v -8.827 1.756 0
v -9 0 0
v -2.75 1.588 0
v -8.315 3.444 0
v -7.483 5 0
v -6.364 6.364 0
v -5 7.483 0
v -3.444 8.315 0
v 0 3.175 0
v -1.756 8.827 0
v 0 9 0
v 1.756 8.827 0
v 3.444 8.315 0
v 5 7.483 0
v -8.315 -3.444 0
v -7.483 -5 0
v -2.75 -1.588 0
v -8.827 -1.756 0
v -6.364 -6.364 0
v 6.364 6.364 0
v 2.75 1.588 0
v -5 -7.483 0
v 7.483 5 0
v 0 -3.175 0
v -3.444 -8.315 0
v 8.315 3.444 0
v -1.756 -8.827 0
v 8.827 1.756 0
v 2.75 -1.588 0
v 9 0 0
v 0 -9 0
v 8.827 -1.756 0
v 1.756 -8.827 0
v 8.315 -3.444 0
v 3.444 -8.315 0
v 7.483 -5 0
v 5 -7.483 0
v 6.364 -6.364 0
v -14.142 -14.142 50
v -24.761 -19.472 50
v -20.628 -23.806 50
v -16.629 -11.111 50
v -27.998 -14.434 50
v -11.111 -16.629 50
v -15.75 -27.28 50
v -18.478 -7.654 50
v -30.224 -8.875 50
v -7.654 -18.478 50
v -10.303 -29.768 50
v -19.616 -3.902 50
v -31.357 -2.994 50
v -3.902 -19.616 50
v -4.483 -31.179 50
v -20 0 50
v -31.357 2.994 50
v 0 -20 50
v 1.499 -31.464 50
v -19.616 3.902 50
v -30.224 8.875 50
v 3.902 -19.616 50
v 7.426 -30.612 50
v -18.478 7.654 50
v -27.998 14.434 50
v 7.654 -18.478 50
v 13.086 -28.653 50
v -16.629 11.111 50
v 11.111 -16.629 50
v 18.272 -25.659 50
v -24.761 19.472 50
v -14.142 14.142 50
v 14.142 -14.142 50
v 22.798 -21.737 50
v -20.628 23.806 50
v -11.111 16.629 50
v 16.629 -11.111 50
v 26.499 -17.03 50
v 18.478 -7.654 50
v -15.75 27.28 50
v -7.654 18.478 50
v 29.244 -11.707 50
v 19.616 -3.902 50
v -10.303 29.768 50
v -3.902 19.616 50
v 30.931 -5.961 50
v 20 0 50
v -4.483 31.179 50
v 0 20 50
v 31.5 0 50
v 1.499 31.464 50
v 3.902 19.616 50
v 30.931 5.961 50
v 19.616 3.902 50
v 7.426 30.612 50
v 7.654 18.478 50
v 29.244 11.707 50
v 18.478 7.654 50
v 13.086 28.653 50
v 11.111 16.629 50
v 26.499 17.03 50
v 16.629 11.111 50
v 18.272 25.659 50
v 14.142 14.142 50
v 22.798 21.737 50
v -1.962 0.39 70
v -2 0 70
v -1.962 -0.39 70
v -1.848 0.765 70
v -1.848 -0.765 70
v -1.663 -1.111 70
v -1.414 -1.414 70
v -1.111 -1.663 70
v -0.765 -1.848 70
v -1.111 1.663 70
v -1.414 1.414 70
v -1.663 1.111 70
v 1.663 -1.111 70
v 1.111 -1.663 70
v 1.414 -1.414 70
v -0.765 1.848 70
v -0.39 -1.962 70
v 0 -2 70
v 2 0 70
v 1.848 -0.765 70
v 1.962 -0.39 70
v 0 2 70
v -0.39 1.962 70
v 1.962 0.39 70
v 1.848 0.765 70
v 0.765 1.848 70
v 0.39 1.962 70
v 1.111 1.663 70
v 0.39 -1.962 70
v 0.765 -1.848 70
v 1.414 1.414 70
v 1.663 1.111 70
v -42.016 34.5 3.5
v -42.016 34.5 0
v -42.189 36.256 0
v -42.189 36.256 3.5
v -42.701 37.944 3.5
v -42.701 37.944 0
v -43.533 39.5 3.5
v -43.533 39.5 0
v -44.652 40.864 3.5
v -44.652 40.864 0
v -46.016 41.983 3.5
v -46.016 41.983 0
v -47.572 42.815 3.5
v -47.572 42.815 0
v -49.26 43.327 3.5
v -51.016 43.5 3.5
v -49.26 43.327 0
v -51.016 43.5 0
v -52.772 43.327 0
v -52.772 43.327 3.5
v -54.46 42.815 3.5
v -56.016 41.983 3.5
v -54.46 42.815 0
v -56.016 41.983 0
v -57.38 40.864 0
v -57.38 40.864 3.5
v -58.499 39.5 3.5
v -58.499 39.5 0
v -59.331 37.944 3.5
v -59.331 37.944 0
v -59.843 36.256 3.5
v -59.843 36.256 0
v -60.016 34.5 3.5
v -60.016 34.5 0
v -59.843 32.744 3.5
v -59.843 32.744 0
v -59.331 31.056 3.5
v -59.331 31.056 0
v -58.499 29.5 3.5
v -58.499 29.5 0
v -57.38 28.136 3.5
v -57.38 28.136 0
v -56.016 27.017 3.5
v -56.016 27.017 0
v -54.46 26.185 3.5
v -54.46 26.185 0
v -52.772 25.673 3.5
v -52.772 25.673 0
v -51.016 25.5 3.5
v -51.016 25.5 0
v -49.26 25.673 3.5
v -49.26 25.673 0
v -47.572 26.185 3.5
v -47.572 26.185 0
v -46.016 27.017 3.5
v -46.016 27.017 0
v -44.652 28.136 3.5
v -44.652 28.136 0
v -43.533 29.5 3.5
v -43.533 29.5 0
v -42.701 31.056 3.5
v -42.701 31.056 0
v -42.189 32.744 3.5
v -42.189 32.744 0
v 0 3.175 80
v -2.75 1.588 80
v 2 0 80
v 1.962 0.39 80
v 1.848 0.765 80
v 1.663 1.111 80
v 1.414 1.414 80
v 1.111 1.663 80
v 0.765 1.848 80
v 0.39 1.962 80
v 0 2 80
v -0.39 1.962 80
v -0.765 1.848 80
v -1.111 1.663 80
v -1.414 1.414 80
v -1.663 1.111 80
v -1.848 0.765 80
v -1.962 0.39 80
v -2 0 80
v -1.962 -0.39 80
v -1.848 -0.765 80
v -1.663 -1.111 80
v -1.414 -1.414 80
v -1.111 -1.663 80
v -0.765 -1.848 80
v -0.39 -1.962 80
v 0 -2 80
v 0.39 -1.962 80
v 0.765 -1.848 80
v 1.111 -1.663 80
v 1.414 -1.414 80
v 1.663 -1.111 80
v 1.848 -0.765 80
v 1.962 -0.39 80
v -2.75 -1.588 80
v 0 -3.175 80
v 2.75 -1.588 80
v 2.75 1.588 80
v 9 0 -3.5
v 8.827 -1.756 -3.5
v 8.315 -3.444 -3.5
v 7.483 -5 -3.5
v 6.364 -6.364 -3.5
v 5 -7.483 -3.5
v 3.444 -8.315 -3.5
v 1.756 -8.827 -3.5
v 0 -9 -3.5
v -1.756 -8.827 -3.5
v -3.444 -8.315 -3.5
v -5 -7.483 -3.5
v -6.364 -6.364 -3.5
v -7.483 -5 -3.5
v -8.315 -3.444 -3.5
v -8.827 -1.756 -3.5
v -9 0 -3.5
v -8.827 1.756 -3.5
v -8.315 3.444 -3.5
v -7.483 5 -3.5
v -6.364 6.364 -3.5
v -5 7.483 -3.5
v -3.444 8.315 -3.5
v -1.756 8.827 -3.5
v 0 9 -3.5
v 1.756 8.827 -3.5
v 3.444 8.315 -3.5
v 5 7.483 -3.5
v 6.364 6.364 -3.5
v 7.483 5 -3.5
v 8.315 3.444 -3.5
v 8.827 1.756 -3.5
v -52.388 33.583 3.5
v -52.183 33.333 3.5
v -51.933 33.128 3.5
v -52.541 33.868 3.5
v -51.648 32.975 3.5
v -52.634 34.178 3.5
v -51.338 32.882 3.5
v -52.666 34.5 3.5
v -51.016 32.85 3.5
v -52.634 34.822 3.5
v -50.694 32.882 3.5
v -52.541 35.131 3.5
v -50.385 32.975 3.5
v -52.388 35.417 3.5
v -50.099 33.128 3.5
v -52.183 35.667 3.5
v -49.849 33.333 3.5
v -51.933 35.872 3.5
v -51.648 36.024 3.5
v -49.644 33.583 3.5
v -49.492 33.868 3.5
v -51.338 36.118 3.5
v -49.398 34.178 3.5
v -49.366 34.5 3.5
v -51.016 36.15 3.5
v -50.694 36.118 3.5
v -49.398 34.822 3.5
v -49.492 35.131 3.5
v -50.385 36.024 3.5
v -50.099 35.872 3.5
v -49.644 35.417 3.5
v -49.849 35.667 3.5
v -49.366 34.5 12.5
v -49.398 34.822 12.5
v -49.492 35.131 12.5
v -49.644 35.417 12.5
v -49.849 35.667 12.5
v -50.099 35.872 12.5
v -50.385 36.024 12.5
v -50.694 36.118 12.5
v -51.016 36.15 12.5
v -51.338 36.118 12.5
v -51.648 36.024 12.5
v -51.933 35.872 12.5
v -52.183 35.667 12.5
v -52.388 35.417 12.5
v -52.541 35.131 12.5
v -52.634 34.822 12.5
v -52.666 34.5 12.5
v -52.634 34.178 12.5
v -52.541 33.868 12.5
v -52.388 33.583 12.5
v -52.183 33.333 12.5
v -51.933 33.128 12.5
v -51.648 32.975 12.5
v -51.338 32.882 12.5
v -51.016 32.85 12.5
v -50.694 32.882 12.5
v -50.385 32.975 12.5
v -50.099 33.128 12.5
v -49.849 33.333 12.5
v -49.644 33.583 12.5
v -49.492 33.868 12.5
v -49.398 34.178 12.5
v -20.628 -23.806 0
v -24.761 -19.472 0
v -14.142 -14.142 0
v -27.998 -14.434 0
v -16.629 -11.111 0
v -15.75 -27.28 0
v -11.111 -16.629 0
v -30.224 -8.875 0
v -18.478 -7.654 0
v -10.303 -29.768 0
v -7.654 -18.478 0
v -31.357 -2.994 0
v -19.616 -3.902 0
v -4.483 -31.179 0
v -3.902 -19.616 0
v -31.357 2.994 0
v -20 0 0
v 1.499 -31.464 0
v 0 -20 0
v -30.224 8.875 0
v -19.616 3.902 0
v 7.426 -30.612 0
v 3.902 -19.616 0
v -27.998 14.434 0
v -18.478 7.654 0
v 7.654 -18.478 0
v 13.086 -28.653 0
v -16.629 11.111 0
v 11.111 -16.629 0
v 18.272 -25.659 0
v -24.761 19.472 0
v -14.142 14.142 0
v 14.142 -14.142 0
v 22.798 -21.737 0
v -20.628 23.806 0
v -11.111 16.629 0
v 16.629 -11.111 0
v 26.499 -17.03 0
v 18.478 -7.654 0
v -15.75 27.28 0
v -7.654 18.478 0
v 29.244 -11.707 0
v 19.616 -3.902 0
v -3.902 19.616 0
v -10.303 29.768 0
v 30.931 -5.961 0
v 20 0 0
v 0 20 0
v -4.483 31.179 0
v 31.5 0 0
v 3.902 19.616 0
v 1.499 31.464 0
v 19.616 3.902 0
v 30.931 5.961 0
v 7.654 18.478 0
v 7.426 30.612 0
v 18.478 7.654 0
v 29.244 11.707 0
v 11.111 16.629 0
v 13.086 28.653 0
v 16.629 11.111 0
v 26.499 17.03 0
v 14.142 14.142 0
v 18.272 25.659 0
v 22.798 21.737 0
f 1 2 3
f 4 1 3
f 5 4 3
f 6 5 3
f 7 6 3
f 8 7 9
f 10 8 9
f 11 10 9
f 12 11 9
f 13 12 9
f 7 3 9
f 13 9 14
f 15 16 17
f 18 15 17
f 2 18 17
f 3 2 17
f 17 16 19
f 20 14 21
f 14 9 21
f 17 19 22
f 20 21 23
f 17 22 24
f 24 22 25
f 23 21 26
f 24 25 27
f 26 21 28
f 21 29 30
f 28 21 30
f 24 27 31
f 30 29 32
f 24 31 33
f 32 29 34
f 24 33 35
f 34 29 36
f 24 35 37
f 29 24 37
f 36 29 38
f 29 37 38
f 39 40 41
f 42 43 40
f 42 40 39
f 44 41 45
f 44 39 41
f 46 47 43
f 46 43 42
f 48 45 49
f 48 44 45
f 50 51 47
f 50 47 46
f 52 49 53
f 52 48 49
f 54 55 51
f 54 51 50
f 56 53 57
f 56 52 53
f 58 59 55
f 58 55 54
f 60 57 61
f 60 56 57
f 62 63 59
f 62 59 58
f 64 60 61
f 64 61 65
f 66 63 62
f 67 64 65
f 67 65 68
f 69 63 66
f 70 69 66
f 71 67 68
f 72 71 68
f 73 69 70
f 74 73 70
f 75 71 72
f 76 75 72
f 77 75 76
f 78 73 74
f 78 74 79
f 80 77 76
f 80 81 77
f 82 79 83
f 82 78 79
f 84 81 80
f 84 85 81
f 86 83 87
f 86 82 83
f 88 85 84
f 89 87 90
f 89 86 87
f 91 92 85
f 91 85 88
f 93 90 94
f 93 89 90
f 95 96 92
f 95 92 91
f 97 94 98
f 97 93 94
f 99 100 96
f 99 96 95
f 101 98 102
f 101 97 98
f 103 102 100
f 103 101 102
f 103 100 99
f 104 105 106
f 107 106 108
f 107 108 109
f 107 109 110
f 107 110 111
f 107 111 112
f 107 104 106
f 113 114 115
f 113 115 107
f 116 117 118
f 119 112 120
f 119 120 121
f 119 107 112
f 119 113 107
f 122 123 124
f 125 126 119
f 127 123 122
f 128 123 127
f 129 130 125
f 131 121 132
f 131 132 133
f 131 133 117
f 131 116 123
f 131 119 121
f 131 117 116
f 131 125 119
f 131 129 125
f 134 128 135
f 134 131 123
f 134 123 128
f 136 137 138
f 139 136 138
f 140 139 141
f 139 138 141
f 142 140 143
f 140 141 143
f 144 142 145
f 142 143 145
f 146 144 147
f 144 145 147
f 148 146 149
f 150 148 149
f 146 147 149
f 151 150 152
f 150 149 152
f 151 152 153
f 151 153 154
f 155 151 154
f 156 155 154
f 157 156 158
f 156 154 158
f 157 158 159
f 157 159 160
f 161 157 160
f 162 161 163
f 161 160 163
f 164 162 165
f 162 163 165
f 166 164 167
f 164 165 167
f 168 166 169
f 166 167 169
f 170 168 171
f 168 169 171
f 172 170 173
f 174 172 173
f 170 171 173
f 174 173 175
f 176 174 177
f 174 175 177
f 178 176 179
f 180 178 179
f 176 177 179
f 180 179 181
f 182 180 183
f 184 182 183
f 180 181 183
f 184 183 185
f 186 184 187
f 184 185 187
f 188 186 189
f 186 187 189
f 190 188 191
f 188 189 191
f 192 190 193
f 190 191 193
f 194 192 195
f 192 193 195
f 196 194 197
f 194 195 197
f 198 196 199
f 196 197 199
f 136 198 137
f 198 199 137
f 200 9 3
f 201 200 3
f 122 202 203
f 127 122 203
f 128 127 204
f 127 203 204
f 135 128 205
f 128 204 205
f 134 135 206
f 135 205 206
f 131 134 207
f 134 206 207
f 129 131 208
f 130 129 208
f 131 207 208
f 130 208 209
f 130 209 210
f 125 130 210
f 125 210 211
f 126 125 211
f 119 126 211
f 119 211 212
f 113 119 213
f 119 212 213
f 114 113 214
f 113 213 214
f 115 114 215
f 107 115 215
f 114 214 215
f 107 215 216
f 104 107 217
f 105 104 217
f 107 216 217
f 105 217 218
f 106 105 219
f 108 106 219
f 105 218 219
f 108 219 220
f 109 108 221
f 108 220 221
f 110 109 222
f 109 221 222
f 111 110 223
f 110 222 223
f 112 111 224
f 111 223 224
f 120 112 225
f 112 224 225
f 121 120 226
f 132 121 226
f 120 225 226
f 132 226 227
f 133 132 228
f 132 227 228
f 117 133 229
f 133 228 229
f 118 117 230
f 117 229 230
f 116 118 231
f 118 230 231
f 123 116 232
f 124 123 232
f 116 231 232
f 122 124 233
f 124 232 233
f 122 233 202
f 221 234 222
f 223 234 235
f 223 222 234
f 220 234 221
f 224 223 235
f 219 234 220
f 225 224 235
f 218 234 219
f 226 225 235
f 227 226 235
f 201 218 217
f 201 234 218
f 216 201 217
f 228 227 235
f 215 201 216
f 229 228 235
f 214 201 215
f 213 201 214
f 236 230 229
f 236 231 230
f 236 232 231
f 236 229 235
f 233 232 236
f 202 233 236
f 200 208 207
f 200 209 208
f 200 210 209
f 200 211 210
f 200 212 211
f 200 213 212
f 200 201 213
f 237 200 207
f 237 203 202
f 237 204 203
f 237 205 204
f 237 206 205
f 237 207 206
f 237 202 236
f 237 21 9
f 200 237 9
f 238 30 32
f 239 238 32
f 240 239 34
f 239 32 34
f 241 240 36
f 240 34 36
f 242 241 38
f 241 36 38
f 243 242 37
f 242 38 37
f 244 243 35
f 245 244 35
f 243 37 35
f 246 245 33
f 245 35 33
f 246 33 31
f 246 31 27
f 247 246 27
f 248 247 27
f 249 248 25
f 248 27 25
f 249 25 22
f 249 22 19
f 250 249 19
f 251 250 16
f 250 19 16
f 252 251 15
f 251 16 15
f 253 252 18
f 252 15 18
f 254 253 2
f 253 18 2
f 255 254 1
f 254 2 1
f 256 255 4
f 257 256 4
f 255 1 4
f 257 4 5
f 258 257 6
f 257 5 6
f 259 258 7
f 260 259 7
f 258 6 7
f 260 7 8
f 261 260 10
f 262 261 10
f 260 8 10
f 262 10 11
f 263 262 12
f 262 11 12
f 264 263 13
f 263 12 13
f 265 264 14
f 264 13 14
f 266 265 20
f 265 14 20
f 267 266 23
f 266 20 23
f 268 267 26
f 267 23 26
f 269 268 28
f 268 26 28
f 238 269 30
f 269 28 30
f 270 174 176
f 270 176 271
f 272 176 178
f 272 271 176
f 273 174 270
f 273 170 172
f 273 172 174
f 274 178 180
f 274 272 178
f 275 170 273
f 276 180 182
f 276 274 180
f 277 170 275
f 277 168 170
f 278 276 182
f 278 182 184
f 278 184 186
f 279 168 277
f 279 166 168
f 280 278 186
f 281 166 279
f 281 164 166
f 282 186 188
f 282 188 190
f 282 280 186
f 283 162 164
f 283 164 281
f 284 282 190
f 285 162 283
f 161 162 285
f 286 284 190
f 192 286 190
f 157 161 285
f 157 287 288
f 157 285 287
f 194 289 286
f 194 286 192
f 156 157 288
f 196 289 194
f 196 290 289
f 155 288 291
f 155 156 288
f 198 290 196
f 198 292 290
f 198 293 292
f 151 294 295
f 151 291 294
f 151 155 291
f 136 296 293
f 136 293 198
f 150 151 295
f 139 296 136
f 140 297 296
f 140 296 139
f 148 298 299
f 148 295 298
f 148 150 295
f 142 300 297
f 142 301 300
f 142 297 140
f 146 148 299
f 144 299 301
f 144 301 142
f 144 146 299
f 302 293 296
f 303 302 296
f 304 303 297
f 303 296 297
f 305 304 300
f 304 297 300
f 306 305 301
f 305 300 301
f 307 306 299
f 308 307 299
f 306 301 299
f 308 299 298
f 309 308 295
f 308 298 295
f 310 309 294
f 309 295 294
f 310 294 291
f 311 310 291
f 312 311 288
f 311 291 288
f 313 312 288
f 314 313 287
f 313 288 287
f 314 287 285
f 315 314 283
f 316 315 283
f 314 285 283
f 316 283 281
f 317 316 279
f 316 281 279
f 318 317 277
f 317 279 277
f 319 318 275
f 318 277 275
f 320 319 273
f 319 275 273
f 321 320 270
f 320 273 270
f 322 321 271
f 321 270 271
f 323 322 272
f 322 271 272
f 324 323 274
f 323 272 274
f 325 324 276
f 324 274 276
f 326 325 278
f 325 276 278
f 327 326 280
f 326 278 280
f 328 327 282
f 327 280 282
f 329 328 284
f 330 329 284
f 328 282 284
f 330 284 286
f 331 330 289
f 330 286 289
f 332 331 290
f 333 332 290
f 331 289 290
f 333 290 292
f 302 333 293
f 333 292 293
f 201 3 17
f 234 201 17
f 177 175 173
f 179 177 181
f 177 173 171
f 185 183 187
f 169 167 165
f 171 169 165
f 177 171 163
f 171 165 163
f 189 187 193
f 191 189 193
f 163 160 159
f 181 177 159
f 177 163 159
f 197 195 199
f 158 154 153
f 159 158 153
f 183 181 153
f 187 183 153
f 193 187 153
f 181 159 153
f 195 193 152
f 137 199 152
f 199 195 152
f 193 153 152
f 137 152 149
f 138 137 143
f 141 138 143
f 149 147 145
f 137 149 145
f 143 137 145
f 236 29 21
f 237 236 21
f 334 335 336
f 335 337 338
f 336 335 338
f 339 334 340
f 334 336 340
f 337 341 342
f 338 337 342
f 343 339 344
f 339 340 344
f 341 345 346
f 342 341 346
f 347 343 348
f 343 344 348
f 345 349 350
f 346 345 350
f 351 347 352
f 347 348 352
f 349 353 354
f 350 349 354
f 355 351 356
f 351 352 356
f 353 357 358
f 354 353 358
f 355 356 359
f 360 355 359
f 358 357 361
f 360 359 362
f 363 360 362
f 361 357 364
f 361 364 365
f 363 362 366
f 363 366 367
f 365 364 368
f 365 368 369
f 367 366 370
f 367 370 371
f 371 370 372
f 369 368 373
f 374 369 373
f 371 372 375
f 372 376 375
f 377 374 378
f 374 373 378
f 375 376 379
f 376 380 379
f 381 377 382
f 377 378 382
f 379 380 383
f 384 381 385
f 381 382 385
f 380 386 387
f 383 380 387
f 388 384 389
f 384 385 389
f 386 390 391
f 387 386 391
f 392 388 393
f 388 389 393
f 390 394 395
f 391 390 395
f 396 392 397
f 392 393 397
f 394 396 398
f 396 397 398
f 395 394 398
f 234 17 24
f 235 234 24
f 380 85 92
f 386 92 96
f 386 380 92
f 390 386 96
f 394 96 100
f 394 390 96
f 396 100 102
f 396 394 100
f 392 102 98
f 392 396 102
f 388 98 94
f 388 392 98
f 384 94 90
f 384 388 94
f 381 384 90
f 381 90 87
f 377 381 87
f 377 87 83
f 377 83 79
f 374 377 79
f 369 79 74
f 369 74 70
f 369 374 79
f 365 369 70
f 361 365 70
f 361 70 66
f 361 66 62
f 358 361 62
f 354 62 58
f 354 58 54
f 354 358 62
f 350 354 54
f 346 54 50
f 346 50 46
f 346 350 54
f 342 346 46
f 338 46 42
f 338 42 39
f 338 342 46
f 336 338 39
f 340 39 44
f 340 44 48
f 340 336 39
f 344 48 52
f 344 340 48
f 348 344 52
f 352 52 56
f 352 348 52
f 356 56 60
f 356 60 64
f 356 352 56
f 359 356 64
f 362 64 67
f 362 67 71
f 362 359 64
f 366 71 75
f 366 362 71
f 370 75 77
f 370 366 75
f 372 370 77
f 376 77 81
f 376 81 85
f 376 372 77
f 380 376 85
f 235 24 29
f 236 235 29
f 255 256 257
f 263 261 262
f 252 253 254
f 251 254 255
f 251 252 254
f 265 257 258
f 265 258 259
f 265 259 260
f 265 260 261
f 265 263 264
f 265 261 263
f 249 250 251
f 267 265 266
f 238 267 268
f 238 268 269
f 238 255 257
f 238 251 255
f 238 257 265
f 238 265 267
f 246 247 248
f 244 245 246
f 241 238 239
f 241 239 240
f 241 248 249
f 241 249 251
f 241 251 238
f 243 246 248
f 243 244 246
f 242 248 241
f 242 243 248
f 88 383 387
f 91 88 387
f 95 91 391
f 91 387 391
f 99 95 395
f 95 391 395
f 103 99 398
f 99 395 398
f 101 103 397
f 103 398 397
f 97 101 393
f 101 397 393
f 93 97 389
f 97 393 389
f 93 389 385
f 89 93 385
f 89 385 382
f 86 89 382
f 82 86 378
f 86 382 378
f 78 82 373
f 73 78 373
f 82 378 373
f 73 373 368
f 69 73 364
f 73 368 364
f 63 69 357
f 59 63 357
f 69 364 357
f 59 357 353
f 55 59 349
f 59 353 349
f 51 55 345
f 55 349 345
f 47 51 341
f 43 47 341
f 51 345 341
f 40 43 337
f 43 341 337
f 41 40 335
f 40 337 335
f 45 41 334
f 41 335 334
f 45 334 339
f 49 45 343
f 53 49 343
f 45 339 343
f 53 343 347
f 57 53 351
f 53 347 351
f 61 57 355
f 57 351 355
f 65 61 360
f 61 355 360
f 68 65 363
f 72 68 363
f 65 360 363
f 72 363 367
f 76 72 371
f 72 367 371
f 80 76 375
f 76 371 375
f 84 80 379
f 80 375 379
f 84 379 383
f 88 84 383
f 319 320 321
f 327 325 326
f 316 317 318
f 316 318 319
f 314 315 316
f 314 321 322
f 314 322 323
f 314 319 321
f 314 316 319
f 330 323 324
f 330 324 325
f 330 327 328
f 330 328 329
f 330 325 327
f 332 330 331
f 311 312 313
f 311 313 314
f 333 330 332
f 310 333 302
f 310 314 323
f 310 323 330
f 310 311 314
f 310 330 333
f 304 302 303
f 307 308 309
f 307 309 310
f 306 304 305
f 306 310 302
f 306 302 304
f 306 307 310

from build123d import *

# Parameters (mm, degrees)
F0_R      = 31.5
F0_R_2    = 20
F1_DEPTH  = 50
F3_DEPTH  = 80
F4_R      = 9
F5_DEPTH  = 3.5
F6_R      = 2
F7_DEPTH  = 10
F8_R      = 9
F9_DEPTH  = 3.5
F10_R     = 1.65
F11_DEPTH = 9


with BuildPart() as f1:
    # F0 (on Top) → F1 (new body)
    with BuildSketch(Plane.XY):
        Circle(F0_R)
        Circle(F0_R_2, mode=Mode.SUBTRACT)
    extrude(amount=F1_DEPTH)


with BuildPart() as f3:
    # F2 (on Top) → F3 (new body)
    with BuildSketch(Plane.XY):
        Polygon((2.75, -1.587713), (2.75, 1.587713), (0, 3.175426), (-2.75, 1.587713), (-2.75, -1.587713), (0, -3.175426), align=None)
    extrude(amount=F3_DEPTH)

    # F4 (on face) → F5 (join)
    with BuildSketch(Plane(origin=(0, 0, 0), x_dir=(1, 0, 0), z_dir=(0, 0, -1))):
        Circle(F4_R)
    extrude(amount=F5_DEPTH)

    # F6 (on face) → F7 (cut)
    with BuildSketch(Plane.XY.offset(80)):
        Circle(F6_R)
    extrude(amount=-F7_DEPTH, mode=Mode.SUBTRACT)


with BuildPart() as f9:
    # F8 (on Top) → F9 (new body)
    with BuildSketch(Plane.XY):
        with Locations((-51.016185, 34.499858)):
            Circle(F8_R)
    extrude(amount=F9_DEPTH)

    # F10 (on face) → F11 (join)
    with BuildSketch(Plane.XY.offset(3.5)):
        with Locations((-51.016185, 34.499858)):
            Circle(F10_R)
    extrude(amount=F11_DEPTH)


solid = Compound([f1.part, f3.part, f9.part])
